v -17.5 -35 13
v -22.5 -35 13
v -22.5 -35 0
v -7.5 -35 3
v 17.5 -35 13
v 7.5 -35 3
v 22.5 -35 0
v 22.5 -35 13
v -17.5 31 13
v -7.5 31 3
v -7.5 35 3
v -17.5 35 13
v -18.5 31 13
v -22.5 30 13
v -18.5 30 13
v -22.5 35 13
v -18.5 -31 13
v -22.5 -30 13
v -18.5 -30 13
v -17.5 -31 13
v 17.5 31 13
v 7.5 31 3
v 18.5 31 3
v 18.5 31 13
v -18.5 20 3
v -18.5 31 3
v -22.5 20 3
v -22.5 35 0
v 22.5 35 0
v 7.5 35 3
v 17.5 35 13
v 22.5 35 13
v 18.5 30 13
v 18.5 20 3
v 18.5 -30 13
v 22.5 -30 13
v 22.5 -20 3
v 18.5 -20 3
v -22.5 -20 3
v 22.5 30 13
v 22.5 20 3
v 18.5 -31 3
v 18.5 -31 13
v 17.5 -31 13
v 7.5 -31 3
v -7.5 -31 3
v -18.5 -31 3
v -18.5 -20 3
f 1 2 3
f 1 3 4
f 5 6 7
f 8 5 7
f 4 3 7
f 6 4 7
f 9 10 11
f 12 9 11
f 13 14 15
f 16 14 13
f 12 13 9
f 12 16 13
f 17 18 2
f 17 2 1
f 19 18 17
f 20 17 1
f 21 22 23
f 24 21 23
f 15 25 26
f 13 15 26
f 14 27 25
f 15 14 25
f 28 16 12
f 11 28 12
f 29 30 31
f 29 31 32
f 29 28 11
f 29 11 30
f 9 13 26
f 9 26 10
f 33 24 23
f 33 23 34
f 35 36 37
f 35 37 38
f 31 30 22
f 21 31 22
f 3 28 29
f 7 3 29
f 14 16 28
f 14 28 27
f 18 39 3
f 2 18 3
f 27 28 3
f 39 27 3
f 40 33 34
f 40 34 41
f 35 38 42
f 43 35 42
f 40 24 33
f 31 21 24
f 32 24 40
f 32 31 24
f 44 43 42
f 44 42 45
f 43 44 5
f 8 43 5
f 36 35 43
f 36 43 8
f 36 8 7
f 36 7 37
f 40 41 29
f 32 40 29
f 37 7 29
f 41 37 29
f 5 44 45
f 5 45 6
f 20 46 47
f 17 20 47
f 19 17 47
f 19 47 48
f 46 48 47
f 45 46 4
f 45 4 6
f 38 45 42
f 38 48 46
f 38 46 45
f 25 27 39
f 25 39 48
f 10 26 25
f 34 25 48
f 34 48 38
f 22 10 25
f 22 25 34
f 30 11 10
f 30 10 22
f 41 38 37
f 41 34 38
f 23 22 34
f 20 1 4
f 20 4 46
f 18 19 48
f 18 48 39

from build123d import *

# Parameters (mm, degrees)
F0_W     = 45
F0_H     = 70
F1_DEPTH = 3
F3_DEPTH = 10
F4_SIZE  = 9.99999


# Not quite as in the source:
# - a fillet or chamfer is up to 0.001 mm smaller than in the source, because OpenCascade refuses the exact size


with BuildPart() as f1:
    # F0 (on Top) → F1 (new body)
    with BuildSketch(Plane.XY):
        Rectangle(F0_W, F0_H)
    extrude(amount=F1_DEPTH)

    # F2 (on face) → F3 (join)
    with BuildSketch(Plane.XY.offset(3)):
        Polygon((-18.5, 20), (-18.5, 31), (-7.5, 31), (-7.5, 35), (-22.5, 35), (-22.5, 20), align=None)
        Polygon((7.5, 35), (7.5, 31), (18.5, 31), (18.5, 20), (22.5, 20), (22.5, 35), align=None)
        Polygon((18.5, -31), (7.5, -31), (7.5, -35), (22.5, -35), (22.5, -20), (18.5, -20), align=None)
        Polygon((-18.5, -31), (-18.5, -20), (-22.5, -20), (-22.5, -35), (-7.5, -35), (-7.5, -31), align=None)
    extrude(amount=F3_DEPTH)

    # F4 (size 10 in the source; OpenCascade refuses exactly that, so slightly less here)
    f4_edges = [f1.edges().sort_by_distance(p)[0] for p in [
        (-7.5, 33, 13),
        (-7.5, -33, 13),
        (-20.5, -20, 13),
        (20.5, -20, 13),
        (20.5, 20, 13),
        (-20.5, 20, 13),
        (7.5, -33, 13),
        (7.5, 33, 13),
    ]]
    chamfer(f4_edges, length=F4_SIZE)


solid = f1.part
